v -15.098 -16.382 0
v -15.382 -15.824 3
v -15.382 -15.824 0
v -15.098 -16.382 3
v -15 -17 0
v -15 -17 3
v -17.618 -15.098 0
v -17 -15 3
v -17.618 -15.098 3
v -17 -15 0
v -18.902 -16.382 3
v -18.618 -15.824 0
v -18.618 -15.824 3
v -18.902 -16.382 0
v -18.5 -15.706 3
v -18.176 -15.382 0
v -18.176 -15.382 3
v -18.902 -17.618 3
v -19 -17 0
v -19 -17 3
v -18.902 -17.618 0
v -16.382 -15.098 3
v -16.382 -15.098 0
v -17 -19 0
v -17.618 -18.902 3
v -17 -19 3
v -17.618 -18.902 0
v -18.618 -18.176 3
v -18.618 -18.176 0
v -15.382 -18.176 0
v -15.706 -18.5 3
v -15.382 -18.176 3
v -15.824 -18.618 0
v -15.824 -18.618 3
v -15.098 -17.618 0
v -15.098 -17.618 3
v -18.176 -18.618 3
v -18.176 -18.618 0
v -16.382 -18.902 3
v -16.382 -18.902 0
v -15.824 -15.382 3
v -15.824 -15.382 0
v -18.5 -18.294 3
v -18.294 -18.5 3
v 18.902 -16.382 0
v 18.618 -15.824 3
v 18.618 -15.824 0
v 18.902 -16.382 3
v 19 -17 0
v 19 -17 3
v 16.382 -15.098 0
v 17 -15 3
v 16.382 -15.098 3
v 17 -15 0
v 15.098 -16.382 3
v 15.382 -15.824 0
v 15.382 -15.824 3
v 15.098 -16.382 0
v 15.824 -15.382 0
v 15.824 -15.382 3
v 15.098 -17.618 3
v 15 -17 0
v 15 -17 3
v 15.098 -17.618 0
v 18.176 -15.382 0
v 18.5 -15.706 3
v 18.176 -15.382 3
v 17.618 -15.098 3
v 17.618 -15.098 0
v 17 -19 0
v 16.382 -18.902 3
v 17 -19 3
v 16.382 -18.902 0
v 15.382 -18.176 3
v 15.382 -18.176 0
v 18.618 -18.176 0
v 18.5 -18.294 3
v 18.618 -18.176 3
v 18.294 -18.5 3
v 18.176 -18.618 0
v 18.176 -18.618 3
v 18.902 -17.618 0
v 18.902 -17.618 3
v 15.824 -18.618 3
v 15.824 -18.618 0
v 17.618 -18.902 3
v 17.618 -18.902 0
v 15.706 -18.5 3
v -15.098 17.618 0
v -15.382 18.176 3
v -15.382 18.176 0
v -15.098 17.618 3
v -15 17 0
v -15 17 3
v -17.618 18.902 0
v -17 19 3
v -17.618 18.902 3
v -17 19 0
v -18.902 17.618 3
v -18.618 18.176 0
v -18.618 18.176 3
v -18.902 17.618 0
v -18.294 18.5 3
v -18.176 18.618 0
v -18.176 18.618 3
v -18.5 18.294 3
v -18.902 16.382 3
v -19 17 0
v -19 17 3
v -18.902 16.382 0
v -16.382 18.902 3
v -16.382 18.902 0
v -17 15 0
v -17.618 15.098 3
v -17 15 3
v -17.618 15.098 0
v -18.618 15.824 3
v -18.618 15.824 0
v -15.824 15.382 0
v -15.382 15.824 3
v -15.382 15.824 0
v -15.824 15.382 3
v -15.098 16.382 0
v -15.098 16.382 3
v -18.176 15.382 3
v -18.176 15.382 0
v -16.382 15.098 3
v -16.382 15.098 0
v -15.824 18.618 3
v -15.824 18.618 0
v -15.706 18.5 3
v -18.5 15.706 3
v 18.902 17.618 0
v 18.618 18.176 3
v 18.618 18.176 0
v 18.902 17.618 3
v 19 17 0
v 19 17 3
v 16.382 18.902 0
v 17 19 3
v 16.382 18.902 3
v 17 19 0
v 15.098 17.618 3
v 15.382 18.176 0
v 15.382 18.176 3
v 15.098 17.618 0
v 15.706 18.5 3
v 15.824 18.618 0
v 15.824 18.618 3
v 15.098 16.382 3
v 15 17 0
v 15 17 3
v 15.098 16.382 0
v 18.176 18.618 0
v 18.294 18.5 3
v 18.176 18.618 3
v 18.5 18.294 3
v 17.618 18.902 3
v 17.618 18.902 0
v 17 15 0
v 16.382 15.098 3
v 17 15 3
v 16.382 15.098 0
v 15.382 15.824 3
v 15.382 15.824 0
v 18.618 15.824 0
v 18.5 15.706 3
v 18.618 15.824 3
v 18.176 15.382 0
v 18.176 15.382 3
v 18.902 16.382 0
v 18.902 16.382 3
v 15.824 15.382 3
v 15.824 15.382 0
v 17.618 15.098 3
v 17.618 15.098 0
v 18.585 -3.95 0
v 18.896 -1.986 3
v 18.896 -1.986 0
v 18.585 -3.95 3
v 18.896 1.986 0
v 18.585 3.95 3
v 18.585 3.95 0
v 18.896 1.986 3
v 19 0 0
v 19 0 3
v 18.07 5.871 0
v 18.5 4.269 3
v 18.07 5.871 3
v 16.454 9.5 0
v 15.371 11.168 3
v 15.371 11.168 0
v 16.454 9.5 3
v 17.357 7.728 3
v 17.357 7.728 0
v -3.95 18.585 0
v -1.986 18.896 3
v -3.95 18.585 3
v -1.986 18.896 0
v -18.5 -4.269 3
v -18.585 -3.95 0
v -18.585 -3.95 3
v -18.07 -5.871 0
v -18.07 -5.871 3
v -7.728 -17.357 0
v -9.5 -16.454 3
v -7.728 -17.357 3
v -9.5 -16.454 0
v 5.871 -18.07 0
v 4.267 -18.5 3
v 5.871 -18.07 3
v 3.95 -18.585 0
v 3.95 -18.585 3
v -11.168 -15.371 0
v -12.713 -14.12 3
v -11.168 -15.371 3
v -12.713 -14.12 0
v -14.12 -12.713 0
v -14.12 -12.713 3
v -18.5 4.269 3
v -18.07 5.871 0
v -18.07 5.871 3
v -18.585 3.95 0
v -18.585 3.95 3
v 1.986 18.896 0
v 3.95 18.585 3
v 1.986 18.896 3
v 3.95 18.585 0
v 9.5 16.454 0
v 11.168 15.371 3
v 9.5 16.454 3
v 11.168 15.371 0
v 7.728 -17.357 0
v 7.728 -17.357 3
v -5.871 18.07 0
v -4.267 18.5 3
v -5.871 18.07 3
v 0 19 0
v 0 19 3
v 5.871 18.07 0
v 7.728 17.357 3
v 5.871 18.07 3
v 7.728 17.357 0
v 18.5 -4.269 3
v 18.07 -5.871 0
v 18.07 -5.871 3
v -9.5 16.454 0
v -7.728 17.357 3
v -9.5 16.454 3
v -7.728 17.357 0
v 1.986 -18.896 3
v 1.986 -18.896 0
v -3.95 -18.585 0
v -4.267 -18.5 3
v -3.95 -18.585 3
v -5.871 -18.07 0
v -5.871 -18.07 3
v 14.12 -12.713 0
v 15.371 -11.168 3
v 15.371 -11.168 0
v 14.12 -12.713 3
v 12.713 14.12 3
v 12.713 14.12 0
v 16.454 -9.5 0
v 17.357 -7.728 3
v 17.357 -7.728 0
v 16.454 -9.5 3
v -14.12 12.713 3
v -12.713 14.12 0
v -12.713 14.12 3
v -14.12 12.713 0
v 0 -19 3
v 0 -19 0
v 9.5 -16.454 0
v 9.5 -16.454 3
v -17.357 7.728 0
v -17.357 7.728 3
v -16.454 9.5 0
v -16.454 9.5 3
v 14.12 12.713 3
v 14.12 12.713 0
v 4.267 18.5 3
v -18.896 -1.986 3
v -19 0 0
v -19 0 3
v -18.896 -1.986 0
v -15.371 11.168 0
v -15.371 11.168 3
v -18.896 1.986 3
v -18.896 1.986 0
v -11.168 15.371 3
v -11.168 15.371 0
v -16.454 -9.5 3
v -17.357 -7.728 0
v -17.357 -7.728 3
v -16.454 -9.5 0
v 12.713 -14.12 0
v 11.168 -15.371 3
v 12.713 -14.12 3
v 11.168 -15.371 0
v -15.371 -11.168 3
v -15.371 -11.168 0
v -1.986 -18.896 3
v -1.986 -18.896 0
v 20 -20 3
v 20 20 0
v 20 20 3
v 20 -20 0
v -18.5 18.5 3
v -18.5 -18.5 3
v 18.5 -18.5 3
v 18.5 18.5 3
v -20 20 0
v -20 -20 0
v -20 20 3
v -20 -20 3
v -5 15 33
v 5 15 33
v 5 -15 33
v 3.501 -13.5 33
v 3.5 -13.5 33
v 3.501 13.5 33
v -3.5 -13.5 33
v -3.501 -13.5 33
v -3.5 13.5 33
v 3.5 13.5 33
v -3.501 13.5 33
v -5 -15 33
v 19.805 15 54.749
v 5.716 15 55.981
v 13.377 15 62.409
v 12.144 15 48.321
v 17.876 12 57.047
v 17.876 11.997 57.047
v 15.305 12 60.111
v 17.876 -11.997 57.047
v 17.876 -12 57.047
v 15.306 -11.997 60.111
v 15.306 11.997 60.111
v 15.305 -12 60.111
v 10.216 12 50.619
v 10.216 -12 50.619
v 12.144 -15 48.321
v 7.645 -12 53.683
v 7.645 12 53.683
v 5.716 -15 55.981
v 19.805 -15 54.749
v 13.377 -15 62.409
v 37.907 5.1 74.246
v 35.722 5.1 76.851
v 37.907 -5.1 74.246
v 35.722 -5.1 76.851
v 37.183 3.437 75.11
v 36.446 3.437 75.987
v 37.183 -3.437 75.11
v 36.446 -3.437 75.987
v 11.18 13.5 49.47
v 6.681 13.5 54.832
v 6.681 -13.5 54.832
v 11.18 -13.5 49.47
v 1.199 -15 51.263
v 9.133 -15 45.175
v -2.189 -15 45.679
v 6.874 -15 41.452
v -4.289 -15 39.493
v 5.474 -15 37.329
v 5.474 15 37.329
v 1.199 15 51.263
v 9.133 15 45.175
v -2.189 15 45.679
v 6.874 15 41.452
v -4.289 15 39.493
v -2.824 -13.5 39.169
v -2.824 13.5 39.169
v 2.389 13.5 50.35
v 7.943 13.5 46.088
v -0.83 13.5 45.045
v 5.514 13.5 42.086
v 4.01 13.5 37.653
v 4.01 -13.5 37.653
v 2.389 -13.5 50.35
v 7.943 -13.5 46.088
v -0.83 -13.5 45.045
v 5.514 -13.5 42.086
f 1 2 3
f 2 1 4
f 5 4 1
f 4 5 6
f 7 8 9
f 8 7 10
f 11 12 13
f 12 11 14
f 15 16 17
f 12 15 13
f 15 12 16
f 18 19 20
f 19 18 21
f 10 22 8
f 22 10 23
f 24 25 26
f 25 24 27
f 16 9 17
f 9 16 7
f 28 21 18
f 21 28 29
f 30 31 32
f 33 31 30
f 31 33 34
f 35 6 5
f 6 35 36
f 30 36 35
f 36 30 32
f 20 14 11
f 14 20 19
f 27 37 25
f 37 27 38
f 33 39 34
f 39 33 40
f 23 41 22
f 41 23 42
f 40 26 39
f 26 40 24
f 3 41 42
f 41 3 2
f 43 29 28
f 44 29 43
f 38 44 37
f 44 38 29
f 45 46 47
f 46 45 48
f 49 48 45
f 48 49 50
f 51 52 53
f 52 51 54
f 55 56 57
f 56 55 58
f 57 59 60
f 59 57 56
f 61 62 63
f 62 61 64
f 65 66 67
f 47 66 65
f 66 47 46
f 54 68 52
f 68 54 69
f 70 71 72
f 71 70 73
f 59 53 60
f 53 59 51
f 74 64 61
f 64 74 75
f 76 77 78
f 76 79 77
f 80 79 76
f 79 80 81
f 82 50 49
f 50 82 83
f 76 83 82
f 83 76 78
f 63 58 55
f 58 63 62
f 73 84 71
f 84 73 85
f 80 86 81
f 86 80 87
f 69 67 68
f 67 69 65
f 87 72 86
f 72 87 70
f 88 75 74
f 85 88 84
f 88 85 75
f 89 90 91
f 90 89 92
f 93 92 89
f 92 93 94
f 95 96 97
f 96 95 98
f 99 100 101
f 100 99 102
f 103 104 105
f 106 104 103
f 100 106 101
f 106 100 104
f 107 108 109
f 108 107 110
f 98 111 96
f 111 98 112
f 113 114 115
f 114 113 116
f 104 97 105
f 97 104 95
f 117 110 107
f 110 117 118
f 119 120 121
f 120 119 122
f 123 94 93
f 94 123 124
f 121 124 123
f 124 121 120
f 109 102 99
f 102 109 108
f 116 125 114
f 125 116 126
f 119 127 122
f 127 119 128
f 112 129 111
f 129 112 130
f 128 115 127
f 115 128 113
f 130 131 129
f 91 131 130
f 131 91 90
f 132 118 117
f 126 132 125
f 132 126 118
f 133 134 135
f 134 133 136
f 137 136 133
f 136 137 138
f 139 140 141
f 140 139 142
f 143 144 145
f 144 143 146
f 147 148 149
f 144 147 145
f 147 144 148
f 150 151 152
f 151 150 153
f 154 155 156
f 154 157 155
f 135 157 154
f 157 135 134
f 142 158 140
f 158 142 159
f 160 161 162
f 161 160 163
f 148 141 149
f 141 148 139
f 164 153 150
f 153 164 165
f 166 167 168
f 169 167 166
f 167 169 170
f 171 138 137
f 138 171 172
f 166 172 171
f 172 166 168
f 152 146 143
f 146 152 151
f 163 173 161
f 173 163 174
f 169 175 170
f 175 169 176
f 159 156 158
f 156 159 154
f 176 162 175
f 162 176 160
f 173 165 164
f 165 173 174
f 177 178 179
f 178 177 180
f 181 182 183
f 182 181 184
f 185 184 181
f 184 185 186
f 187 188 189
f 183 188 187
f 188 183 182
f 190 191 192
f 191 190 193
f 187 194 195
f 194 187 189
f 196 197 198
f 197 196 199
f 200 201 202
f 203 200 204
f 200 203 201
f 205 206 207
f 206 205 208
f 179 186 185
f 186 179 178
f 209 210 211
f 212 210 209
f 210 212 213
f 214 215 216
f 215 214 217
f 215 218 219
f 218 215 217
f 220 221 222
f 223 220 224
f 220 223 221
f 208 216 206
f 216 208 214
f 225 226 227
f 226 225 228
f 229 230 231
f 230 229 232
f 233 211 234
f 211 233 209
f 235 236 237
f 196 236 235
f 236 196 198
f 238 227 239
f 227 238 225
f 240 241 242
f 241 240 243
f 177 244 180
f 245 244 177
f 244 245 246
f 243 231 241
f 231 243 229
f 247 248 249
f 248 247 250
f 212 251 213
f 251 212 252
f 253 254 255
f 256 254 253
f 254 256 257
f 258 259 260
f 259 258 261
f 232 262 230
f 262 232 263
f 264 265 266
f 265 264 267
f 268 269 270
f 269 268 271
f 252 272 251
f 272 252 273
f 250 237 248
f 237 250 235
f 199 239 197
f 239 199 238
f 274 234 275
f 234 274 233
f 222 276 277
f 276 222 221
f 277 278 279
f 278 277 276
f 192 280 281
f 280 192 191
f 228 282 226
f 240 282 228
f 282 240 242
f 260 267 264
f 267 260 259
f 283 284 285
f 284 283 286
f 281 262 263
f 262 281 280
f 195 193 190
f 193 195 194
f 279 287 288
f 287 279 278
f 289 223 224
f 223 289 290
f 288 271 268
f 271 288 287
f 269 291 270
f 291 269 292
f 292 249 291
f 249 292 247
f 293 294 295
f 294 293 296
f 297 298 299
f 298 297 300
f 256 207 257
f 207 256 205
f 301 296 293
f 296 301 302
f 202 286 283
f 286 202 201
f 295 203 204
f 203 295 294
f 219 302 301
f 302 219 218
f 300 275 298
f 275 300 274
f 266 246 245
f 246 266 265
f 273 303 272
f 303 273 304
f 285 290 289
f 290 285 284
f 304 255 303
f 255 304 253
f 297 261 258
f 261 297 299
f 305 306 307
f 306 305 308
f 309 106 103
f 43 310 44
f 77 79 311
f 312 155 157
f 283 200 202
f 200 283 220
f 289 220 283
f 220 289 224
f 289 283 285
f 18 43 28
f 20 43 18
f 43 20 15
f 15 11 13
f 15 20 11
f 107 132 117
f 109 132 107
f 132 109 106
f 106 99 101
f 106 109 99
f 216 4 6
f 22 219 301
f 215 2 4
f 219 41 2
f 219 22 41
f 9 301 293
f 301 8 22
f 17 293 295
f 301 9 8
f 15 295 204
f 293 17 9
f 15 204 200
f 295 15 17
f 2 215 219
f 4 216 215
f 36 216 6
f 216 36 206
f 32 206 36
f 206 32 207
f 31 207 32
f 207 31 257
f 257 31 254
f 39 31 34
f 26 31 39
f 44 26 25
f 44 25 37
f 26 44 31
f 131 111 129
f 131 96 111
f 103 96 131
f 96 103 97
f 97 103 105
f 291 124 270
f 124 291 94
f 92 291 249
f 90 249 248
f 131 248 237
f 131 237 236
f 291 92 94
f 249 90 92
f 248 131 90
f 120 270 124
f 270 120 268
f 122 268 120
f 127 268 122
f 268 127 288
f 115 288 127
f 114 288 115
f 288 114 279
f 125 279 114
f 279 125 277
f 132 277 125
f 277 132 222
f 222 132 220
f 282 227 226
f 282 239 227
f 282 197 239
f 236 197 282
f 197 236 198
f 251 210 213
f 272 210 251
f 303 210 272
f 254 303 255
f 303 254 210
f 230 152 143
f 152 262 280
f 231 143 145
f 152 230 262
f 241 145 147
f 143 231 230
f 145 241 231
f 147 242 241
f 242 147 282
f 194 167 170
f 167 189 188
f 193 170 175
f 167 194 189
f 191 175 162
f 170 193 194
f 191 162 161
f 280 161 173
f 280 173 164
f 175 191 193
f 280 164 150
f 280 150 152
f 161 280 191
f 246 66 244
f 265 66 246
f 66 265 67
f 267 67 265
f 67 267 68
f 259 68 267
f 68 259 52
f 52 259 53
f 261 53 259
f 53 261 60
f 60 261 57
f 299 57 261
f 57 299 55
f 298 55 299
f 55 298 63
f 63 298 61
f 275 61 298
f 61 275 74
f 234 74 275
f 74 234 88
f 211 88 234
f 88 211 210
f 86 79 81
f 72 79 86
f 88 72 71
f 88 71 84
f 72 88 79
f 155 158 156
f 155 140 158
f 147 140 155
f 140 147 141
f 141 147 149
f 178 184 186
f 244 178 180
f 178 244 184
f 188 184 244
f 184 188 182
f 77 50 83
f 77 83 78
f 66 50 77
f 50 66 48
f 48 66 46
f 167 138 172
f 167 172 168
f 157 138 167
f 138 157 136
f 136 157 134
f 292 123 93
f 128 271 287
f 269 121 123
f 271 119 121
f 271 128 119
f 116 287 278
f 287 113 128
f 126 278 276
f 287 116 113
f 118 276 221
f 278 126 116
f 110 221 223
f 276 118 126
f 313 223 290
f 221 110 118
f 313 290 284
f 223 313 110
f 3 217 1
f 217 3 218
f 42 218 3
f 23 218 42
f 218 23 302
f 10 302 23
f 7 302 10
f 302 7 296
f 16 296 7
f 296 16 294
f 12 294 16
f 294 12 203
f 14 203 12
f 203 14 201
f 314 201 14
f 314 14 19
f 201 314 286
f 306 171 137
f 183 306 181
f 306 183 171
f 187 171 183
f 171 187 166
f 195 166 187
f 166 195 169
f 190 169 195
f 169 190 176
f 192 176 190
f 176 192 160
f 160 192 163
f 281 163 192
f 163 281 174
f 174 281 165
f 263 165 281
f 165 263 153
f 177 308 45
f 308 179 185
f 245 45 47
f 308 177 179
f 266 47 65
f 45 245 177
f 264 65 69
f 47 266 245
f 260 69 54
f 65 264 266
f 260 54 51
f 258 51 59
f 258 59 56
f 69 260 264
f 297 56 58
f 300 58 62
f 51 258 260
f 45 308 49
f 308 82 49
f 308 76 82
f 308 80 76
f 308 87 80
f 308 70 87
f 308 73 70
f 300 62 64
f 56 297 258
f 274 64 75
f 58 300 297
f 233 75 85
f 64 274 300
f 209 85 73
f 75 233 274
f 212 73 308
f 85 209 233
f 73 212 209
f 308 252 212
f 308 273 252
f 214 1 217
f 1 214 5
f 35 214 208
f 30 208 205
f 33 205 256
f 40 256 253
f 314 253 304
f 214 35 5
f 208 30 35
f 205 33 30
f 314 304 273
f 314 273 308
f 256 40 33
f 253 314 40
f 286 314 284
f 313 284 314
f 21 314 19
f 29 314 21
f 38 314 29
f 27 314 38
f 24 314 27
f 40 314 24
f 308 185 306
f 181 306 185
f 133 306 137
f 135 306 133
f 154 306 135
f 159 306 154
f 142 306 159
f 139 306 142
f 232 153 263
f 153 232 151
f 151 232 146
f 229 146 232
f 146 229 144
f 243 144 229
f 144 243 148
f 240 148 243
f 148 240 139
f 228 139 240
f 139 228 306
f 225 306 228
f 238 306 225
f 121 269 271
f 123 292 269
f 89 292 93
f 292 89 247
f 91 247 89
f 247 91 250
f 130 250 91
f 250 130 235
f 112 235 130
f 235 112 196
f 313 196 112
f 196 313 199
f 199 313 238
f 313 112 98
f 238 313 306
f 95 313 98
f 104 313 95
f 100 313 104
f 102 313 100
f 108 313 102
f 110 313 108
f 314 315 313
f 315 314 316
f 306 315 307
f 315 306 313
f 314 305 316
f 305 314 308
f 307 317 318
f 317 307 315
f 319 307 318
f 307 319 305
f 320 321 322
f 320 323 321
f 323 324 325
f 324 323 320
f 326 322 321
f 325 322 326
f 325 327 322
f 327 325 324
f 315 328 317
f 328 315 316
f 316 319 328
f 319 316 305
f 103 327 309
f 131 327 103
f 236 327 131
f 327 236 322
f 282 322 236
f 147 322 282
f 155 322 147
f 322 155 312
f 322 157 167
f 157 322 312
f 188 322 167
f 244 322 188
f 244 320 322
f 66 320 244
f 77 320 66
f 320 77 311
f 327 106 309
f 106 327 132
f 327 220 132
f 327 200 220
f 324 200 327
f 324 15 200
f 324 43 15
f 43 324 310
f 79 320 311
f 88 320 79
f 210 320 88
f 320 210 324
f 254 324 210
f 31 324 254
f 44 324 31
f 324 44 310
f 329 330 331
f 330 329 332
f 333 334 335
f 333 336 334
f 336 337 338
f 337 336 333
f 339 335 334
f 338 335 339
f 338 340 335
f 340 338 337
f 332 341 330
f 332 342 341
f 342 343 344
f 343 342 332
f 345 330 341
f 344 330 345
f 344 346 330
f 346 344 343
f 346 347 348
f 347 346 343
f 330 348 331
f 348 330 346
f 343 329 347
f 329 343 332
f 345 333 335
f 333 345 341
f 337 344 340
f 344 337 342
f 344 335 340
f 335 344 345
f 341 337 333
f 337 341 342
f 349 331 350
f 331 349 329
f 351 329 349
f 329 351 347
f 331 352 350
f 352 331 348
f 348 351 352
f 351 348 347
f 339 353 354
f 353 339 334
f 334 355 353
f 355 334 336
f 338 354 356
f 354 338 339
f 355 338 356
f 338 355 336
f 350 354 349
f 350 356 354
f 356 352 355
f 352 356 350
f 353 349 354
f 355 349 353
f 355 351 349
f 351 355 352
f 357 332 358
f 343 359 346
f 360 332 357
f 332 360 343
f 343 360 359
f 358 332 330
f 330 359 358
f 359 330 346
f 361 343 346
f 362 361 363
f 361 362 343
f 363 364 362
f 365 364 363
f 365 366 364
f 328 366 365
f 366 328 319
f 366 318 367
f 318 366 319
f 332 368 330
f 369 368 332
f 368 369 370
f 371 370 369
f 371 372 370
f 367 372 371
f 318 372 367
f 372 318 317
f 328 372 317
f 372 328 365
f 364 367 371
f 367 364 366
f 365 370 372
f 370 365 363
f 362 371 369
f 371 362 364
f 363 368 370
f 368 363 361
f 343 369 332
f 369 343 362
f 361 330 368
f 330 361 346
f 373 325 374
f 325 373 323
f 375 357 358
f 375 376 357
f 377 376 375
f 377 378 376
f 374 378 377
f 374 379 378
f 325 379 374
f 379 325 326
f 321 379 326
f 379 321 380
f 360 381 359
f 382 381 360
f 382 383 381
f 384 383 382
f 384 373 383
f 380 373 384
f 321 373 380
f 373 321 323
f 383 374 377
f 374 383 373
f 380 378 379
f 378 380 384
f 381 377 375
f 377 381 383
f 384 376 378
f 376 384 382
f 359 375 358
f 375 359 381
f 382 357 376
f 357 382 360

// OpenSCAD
// file: ../primitives/bent.scad
use <../math/vect.scad>

// x = 10;
// y = 40;
// r = 30;
// angle = 90;
// bent_tube([x, y], [8, 28], angle, r);
// rotate_to_bent_face(x, angle, r){
//     cube([20, 40, 40]);
// }


module bent_2d(angle, r){
    mirror([0, 1 ,0])
    mirror([1, 0, 0])
        rotate([90, 0, 0])
            //translate([-r, 0])
                rotate_extrude(convexity = 10, angle = angle){
                    translate([r, 0])
                        children();
                }
}


module bent_cube(size, angle, r){
    translate([size[0] + r, 0, 0])
        bent_2d(angle, r)
            square([size[0], size[1]]);
}

// bent_tube([10, 50], [8, 48], 90, 20);

module bent_tube(size, size1, angle, r){
    translate([size[0] + r, 0, 0])
        bent_2d(angle, r){
            difference(){
                square([size[0], size[1]]);
                    translate([(size[0] - size1[0])/2, (size[1] - size1[1])/2])
                        square([size1[0], size1[1]]);
            }
        }
}

module rotate_to_bent_face(x, angle, r){
    offset = r + x;
    translate([offset, 0, 0])
        rotate([0, angle, 0])
            translate([ - offset, 0])
                children();
}
x = 10;
y = 40;
r = 30;
angle = 90;
bent_tube([x, y], [8, 28], angle, r);
rotate_to_bent_face(x, angle, r){
    cube([20, 40, 40]);
}

// rotate_extrude(convexity = 10, angle = 90)
// square([10, 20]);

// mirror([1, 0, 0])
// angle = 45;
// rotate([-90, 0, 0])
// rotate_extrude(convexity = 10, angle = angle)
// translate ([-30, 0])
// polygon([[15,10], [30,10], [15, 15]]);
// file: ../connectors/simple_rotating_connector.scad
use <../primitives/bent.scad>
use <../math/align.scad>
module simple_rotating_connector(size, wall_size, angle, r, center = false){
    x = size[0];
    y = size[1];

    align_center([x, y, 0], center)
        bent_tube([x, y], [x - wall_size, y - wall_size], angle, r);
            rotate_to_bent_face(x, angle, r)
                children();
}
// file: ../coolers/cooler.scad
h = 50;
poly_n = 20;
use <../math/align.scad>;

module cooler_screw_holes(sizes, hole_d, height = h){
    r = hole_d / 2;
    align_center(sizes){
        translate([r, r, 0]){
            cylinder(sizes[2], r1 = r, r2 = r, center = false, $fn=poly_n);
        }
        translate([sizes[0] - r, r, 0]){
            cylinder(sizes[2], r1 = r, r2 = r, center = false, $fn=poly_n);
        }
        translate([r, sizes[1] - r, 0]){
            cylinder(sizes[2], r1 = r, r2 = r, center = false, $fn=poly_n);
        }
        translate([sizes[0] - r, sizes[1] - r, 0]){
            cylinder(sizes[2], r1 = r, r2 = r, center = false, $fn=poly_n);
        }
    }
}


function _map_sizes(size) =
    (size == 40) ? [38, 38, 4]:
    (size == 50) ? [48, 48, 4]: -1;

module cooler_main_hole(r){
    cylinder(h, r / 2, r / 2, $fn=poly_n * 3);
}

module standard_cooler_screw_holes(size){
    size = _map_sizes(size);
    group(){
        cooler_screw_holes([size[0], size[0], h], size[2]);
        cooler_main_hole(size[1]);
    }
}

module standard_cooler_plate(size, h=3){
    difference(){
        align_center(size){
            cube([size, size, h]);
        }
        translate([0,0, -1]){
            standard_cooler_screw_holes(size);
        }
    }
}

standard_cooler_plate(40);
// file: ../math/align.scad
use <vect.scad>
module align_center(sizes, center = true, centerZ = false){
    sizes = vSize(sizes);
    if (center){
        translate([-sizes[0] / 2, -sizes[1] / 2, (centerZ ? -sizes[2]/2 : 0)]){
            children();
        }
    } else {
        children();
    }   
}

module align_uncenter(sizes, uncenter = true, uncenterZ = false){
    sizes = vSize(sizes);
    if (uncenter){
        translate([sizes[0] / 2, sizes[1] / 2, (uncenterZ ? sizes[2]/2 : 0)]){
            children();
        }
    } else {
        children();
    }   
}


// align_center(20){
//     align_uncenter(20){
//         cube(20);
//     }
// }
// file: ../math/vect.scad
function vect_scalar_sum(v, incr) = [for (i = [0: len(v) - 1]) v[i] + incr];

function vSize(size) = (!is_list(size)) ? [size, size, size]: size; 


function vect_2d_to_3d(vect, z = 0) = [vect[0], vect[1], z];

function vect_rotate2d(vect, b) = [
    cos(b) * vect[0] - sin(b) * vect[1],
    sin(b) * vect[0] + cos(b) * vect[1]
];

function round_vect(v) = [for (i = [0: len(v) - 1]) round(v[i])];
// file: ../primitives/pyramid.scad
use <../math/align.scad>
use <../math/vect.scad>
module pyramid3(size, heiht, center = false, r=0){
    // center = [size[0] / 2, size[1] / 2, size[2] / 2]
    // points = [[ 0, 0, 0], [size[0], 0, 0], [ 0, size[1], 0],
    //       [ 0, 0, 0], [size[0], 0, 0], [ 0, size[1], 0],
    //       [ 0, size[1], 0], [size[0], 0, 0], [ 0, 0, size[2]],
    //       [ 0, 0, 0], [ 0, 0, size[2]], [size[0], 0, 0],
    //       [ 0, 0, 0], [ 0, size[1], 0], [ 0, 0, size[2]]];
    // faces = [[0,1,2], [3,4,5], [6,7,8], [9,10,11], [12,13,14]];
    // polyhedron(points, faces);
}

//
//
//

module pyramid4(sizes, center){
    align_uncenter(sizes, !center){
        size = [sizes[0] / 2 , sizes[1] / 2, sizes[2]];
        polyhedron(
        points=[ 
            [size[0],size[1],0],
            [size[0],-size[1],0],
            [-size[0],-size[1],0],
            [-size[0],size[1],0], // the four points at base
            [0,0,size[2]]  
        ],                                
        faces=[ 
            [0,1,4],
            [1,2,4],
            [2,3,4],
            [3,0,4],              // each triangle side
            [1,0,3],
            [2,1,3] 
        ]                         // two triangles for square base
        );
    }
}

//
// 
// truncated_pyramid4([20, 20, 30], [5, 5], center = false);
//
module truncated_pyramid4(sizes, top_sizes, center = true){
    align_uncenter(sizes, !center){
        size = [sizes[0] / 2 , sizes[1] / 2, sizes[2]];
        top_size = [top_sizes[0] / 2 , top_sizes[1] / 2];
        h = size[2];
        polyhedron(
        points=[ 
            [size[0], size[1], 0],
            [size[0], -size[1], 0],
            [-size[0], -size[1], 0],
            [-size[0], size[1], 0], // the four points at base

            [top_size[0], top_size[1], h],
            [top_size[0], -top_size[1], h],
            [-top_size[0], -top_size[1], h],
            [-top_size[0], top_size[1], h],
        ],                                 // the apex point 
        faces=[ 
            [3, 2, 1, 0],
            [0, 1, 5, 4],
            [1, 2, 6, 5],
            [2, 3, 7, 6],
            [3, 0, 4, 7],
            [4, 5, 6, 7]
        ]);
    }
}

// truncated_pyramid4([20, 20, 30], [15, 5], center = true);


module pyramid(angles, r, r1, h, center = true){
    function _2d_dot(vect, angle) = vect_rotate2d(vect, angle);
    function _dot(vect, angle, z) = vect_2d_to_3d(_2d_dot(vect, angle), z);
    function _adapt_index(i, num) = 
        i < 0 ? _adapt_index(num + i, num) :
        i < num ? i : _adapt_index(i - num, num);
    function _du(i, num) = _adapt_index(i, num) + num;
    function _db(i, num) = _adapt_index(i, num);

    vect = [r, 0];
    vectU = [r1, 0];
    angle = 360 / angles;
    points = concat(
        [for (i = [0: angles - 1]) _dot(vect, i * angle, 0)],
        [for (i = [0: angles - 1]) _dot(vectU, i * angle, h)]
    );

    faces = concat(
        [[for (i = [0: angles - 1]) _db(i, angles)]],
        [[for (i = [0: angles - 1]) _du(angles - i, angles)]],
        [for (i = [0: angles]) [
            _db(i, angles),
            _du(i, angles), 
            _du(i + 1, angles), 
            _db(i + 1, angles) 
            ]
        ]
    );
    polyhedron(points=points, faces=faces);
}

pyramid(4, 20, 10, 50);
// file: ../primitives/box.scad
module cube_round(size, center = false, r=0){
    sx = size[0] - 2 * r;
    sy = size[1] - 2 * r;
    sz = size[2] - 2 * r;
    translate([r, r, r]) hull() {
        for (offset=[[0, 0, 0],
                     [0, 0, sz],
                     [0, sy, sz],
                     [0, sy, 0],
                     [sx, sy, 0],
                     [sx, sy, sz],
                     [sx, 0, sz],
                     [sx, 0, 0]])
        {
            translate(offset) sphere(r);
        }
    }
}

module cube_hole(size, wallWidth, center = false){
    if (!center){
        translate([size[0] / 2, size[1] / 2, size[2] / 2]){
            _cube_hole_centered(size, wallWidth);
        }
    } else {
        _cube_hole_centered(size, wallWidth);
    }
}

module _cube_hole_centered(size, wallWidth){
    iSize = [size[0] - wallWidth * 2, size[1] - wallWidth * 2, size[2] + 1];
    difference(){
        cube(size, center = true);
        cube(iSize, center = true);
    }
}


cube_round([200,200,200], r=4);
// main file
use <../primitives/box.scad>;
use <../primitives/pyramid.scad>;
use <../math/vect.scad>;
use <../math/align.scad>;
use <../coolers/cooler.scad>;
use <../connectors/simple_rotating_connector.scad>;


size = [30, 10, 30];
wallWidth = 3;
nozzle_angle = 50;
nozzle_r = 20;
pyramid_h = 30;
nozzle_h_multiplier = 0.66;

module bent_nozzle(size, wallWidth){
    dx = 0.01;

    boxH = size[2] * 1 / 3;
    nozzleFullH = (size[2] - boxH) * 2;
    nozzleSize = [size[0], size[1], nozzleFullH];
    nozzleHeight = nozzleFullH * nozzle_h_multiplier;

    module nozzle(nozzleSize){
        difference(){
            pyramid4(nozzleSize, center = false);
            nozzleSize1 = vect_scalar_sum(nozzleSize, -wallWidth);
            nozzleSizeM = [nozzleSize1[0] - wallWidth, nozzleSize1[1] - wallWidth, nozzleSize1[2] + dx];
            translate([wallWidth, wallWidth, - dx]){
                pyramid4(nozzleSizeM, center = false);
            }
        }
    }

    module truncated_nozzle(nozzleSize){
        difference(){
            nozzle(nozzleSize);
            translate([0, 0, nozzleHeight]){
                cube(nozzleSize);
            }
        }
    }
    module nozzle_head(){
        align_center(size, centerZ = false){
            boxSize = [size[0], size[1], boxH];
            cube_hole(boxSize, wallWidth, center = false);
            translate([0, 0, boxH]){ 
                truncated_nozzle(nozzleSize);    
            }
        }
    }

    align_center([size[1], size[0]])
        simple_rotating_connector([size[1], size[0]], wallWidth, nozzle_angle, nozzle_r, false)
            translate([size[1], 0])
            rotate([0, 0, 90])
                align_uncenter([size[0], size[1]])
                    nozzle_head();
        

}
standard_cooler_plate(40);
translate([0,0, 3]){
    difference(){
        truncated_pyramid4([40, 40, pyramid_h], [size[1], size[0]], center = true);
        translate([0, 0, -0.001])
            truncated_pyramid4([40 - wallWidth, 40 - wallWidth, pyramid_h + 0.003], [size[1] - wallWidth, size[0] - wallWidth], center = true);
    }
    translate([0,0, pyramid_h])
        bent_nozzle(size, wallWidth);
}

//truncated_pyramid4([40, 40, 30], [size[1], size[0]], center = true);
//truncated_pyramid4([40 - wallWidth, 40 - wallWidth, 30], [size[1] - wallWidth, size[0] - wallWidth], center = true);
